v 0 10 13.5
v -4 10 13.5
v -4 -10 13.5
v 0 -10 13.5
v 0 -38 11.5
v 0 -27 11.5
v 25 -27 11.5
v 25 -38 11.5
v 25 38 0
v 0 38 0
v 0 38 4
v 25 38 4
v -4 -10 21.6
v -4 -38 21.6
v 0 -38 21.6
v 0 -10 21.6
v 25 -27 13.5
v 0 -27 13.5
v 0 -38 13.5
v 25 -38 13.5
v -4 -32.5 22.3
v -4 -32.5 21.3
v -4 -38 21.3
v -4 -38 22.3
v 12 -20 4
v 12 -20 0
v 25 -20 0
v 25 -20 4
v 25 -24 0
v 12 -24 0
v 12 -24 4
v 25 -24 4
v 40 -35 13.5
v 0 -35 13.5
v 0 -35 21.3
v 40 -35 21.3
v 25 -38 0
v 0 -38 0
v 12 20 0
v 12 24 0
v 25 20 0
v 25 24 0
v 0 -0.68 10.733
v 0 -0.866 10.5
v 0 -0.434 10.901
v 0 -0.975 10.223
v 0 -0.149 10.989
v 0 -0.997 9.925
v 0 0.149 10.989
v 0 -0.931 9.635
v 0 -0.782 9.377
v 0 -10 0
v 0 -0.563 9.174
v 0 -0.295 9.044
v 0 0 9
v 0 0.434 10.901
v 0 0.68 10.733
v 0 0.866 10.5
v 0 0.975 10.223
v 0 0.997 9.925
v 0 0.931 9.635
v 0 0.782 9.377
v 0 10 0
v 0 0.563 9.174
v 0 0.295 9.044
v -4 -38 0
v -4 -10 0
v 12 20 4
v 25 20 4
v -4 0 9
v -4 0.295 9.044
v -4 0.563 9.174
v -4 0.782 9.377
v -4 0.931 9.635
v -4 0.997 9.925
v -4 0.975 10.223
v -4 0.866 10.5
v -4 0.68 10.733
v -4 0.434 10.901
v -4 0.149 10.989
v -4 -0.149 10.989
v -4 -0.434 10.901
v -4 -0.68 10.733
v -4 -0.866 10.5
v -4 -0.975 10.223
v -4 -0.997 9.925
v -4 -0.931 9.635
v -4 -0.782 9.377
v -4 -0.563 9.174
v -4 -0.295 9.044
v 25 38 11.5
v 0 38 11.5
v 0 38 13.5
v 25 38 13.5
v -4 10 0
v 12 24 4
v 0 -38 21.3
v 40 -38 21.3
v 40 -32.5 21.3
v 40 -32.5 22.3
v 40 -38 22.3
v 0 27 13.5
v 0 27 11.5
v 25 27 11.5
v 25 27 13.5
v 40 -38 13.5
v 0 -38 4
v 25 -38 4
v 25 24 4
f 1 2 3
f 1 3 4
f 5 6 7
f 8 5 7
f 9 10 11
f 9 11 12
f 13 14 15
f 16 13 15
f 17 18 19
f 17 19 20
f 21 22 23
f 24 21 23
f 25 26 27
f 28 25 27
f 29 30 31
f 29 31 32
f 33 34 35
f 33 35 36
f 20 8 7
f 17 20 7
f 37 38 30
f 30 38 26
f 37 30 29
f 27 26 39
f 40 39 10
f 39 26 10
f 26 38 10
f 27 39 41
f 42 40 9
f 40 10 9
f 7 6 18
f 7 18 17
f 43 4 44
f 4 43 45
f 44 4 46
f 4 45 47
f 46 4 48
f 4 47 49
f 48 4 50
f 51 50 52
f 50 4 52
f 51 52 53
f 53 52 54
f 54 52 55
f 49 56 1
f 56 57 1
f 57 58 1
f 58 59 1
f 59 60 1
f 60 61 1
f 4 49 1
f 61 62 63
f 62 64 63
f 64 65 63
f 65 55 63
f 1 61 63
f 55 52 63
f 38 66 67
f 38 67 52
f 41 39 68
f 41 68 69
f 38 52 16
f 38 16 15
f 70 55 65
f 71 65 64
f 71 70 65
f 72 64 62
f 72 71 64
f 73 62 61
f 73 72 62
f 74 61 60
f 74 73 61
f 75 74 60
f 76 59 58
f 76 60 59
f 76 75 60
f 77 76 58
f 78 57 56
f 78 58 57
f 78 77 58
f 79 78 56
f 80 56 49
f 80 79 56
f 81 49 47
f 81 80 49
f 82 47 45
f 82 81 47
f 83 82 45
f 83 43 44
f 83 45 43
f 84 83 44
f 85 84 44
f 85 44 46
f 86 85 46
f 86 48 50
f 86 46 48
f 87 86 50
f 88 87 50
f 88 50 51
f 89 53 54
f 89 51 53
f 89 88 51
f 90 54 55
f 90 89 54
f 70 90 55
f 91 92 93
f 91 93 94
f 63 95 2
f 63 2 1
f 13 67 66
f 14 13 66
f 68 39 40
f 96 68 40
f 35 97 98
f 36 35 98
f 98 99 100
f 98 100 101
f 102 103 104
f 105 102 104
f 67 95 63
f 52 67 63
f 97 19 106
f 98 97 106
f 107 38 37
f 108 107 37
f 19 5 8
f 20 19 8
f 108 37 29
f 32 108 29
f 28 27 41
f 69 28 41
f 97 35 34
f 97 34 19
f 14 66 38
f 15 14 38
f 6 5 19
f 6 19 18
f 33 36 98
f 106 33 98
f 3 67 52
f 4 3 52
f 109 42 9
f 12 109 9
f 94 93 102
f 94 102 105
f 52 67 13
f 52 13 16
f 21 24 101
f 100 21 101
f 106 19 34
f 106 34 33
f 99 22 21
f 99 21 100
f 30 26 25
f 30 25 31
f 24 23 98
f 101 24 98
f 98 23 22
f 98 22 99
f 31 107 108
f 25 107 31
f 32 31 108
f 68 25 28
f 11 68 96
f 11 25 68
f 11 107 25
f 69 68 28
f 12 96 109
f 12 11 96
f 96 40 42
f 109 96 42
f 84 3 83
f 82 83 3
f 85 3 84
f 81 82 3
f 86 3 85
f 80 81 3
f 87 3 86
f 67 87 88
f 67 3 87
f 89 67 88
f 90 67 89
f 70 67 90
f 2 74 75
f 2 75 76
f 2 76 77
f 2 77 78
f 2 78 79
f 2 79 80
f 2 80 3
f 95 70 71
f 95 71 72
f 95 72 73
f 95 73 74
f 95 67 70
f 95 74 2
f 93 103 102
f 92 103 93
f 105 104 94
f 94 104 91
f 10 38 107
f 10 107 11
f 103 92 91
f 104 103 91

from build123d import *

# Parameters (mm, degrees)
BOX001_W       = 13
BOX001_H       = 4
BOX001_DEPTH   = 9
BOX_W          = 25
BOX_H          = 76
BOX_DEPTH      = 4
BOX002_W       = 4
BOX002_H       = 28
BOX002_DEPTH   = 21.6
BOX003_W       = 40
BOX003_H       = 3
BOX003_DEPTH   = 7.8
BOX004_W       = 44
BOX004_H       = 5.5
BOX004_DEPTH   = 1
BOX007_W       = 25
BOX007_H       = 54
BOX007_DEPTH   = 5
BOX005_W       = 25
BOX005_H       = 76
BOX005_DEPTH   = 2
CYLINDER_R     = 1
CYLINDER_DEPTH = 30
BOX006_W       = 4
BOX006_H       = 20
BOX006_DEPTH   = 13.5


with BuildPart() as cube001:
    # Box001 → Box001 (new body)
    with BuildSketch(Plane(origin=(12, 20, 0), x_dir=(1, 0, 0), z_dir=(0, 0, 1))):
        with Locations((6.5, 2)):
            Rectangle(BOX001_W, BOX001_H)
    extrude(amount=BOX001_DEPTH)


with BuildPart() as part_mirroring:
    # Part__Mirroring: instance of Cube001
    add(cube001.part.mirror(Plane(origin=(0, 0, 0), x_dir=(1, 0, 0), z_dir=(0, 1, 0))))


with BuildPart() as cut001:
    # Box → Box (new body)
    with BuildSketch(Plane(origin=(0, -38, 0), x_dir=(1, 0, 0), z_dir=(0, 0, 1))):
        with Locations((12.5, 38)):
            Rectangle(BOX_W, BOX_H)
    extrude(amount=BOX_DEPTH)

    # Cut: cut Cube001
    add(cube001.part, mode=Mode.SUBTRACT)

    # Cut001: cut Part__Mirroring
    add(part_mirroring.part, mode=Mode.SUBTRACT)


with BuildPart() as backplane:
    # Box002 → Box002 (new body)
    with BuildSketch(Plane(origin=(-4, 10, 0), x_dir=(1, 0, 0), z_dir=(0, 0, 1))):
        with Locations((2, 14)):
            Rectangle(BOX002_W, BOX002_H)
    extrude(amount=BOX002_DEPTH)


with BuildPart() as part_mirroring001:
    # Part__Mirroring001: instance of Backplane
    add(backplane.part.mirror(Plane(origin=(0, 0, 0), x_dir=(1, 0, 0), z_dir=(0, 1, 0))))


with BuildPart() as arm:
    # Box003 → Box003 (new body)
    with BuildSketch(Plane(origin=(0, 35, 13.5), x_dir=(1, 0, 0), z_dir=(0, 0, 1))):
        with Locations((20, 1.5)):
            Rectangle(BOX003_W, BOX003_H)
    extrude(amount=BOX003_DEPTH)


with BuildPart() as part_mirroring002:
    # Part__Mirroring002: instance of arm
    add(arm.part.mirror(Plane(origin=(0, 0, 0), x_dir=(1, 0, 0), z_dir=(0, 1, 0))))


with BuildPart() as top:
    # Box004 → Box004 (new body)
    with BuildSketch(Plane(origin=(-4, 32.5, 21.3), x_dir=(1, 0, 0), z_dir=(0, 0, 1))):
        with Locations((22, 2.75)):
            Rectangle(BOX004_W, BOX004_H)
    extrude(amount=BOX004_DEPTH)


with BuildPart() as part_mirroring003:
    # Part__Mirroring003: instance of top
    add(top.part.mirror(Plane(origin=(0, 0, 0), x_dir=(1, 0, 0), z_dir=(0, 1, 0))))


with BuildPart() as cube002:
    # Box007 → Box007 (new body)
    with BuildSketch(Plane(origin=(0, -27, 10), x_dir=(1, 0, 0), z_dir=(0, 0, 1))):
        with Locations((12.5, 27)):
            Rectangle(BOX007_W, BOX007_H)
    extrude(amount=BOX007_DEPTH)


with BuildPart() as cut002:
    # Box005 → Box005 (new body)
    with BuildSketch(Plane(origin=(0, -38, 11.5), x_dir=(1, 0, 0), z_dir=(0, 0, 1))):
        with Locations((12.5, 38)):
            Rectangle(BOX005_W, BOX005_H)
    extrude(amount=BOX005_DEPTH)

    # Cut002: cut Cube002
    add(cube002.part, mode=Mode.SUBTRACT)


with BuildPart() as cylinder:
    # Cylinder → Cylinder (new body)
    with BuildSketch(Plane(origin=(-4, 0, 10), x_dir=(0, 0, -1), z_dir=(1, 0, 0))):
        Circle(CYLINDER_R)
    extrude(amount=CYLINDER_DEPTH)


with BuildPart() as cut003:
    # Box006 → Box006 (new body)
    with BuildSketch(Plane(origin=(-4, -10, 0), x_dir=(1, 0, 0), z_dir=(0, 0, 1))):
        with Locations((2, 10)):
            Rectangle(BOX006_W, BOX006_H)
    extrude(amount=BOX006_DEPTH)

    # Cut003: cut Cylinder
    add(cylinder.part, mode=Mode.SUBTRACT)


solid = Compound([cut001.part, part_mirroring001.part, part_mirroring002.part, part_mirroring003.part, cut002.part, cut003.part])
